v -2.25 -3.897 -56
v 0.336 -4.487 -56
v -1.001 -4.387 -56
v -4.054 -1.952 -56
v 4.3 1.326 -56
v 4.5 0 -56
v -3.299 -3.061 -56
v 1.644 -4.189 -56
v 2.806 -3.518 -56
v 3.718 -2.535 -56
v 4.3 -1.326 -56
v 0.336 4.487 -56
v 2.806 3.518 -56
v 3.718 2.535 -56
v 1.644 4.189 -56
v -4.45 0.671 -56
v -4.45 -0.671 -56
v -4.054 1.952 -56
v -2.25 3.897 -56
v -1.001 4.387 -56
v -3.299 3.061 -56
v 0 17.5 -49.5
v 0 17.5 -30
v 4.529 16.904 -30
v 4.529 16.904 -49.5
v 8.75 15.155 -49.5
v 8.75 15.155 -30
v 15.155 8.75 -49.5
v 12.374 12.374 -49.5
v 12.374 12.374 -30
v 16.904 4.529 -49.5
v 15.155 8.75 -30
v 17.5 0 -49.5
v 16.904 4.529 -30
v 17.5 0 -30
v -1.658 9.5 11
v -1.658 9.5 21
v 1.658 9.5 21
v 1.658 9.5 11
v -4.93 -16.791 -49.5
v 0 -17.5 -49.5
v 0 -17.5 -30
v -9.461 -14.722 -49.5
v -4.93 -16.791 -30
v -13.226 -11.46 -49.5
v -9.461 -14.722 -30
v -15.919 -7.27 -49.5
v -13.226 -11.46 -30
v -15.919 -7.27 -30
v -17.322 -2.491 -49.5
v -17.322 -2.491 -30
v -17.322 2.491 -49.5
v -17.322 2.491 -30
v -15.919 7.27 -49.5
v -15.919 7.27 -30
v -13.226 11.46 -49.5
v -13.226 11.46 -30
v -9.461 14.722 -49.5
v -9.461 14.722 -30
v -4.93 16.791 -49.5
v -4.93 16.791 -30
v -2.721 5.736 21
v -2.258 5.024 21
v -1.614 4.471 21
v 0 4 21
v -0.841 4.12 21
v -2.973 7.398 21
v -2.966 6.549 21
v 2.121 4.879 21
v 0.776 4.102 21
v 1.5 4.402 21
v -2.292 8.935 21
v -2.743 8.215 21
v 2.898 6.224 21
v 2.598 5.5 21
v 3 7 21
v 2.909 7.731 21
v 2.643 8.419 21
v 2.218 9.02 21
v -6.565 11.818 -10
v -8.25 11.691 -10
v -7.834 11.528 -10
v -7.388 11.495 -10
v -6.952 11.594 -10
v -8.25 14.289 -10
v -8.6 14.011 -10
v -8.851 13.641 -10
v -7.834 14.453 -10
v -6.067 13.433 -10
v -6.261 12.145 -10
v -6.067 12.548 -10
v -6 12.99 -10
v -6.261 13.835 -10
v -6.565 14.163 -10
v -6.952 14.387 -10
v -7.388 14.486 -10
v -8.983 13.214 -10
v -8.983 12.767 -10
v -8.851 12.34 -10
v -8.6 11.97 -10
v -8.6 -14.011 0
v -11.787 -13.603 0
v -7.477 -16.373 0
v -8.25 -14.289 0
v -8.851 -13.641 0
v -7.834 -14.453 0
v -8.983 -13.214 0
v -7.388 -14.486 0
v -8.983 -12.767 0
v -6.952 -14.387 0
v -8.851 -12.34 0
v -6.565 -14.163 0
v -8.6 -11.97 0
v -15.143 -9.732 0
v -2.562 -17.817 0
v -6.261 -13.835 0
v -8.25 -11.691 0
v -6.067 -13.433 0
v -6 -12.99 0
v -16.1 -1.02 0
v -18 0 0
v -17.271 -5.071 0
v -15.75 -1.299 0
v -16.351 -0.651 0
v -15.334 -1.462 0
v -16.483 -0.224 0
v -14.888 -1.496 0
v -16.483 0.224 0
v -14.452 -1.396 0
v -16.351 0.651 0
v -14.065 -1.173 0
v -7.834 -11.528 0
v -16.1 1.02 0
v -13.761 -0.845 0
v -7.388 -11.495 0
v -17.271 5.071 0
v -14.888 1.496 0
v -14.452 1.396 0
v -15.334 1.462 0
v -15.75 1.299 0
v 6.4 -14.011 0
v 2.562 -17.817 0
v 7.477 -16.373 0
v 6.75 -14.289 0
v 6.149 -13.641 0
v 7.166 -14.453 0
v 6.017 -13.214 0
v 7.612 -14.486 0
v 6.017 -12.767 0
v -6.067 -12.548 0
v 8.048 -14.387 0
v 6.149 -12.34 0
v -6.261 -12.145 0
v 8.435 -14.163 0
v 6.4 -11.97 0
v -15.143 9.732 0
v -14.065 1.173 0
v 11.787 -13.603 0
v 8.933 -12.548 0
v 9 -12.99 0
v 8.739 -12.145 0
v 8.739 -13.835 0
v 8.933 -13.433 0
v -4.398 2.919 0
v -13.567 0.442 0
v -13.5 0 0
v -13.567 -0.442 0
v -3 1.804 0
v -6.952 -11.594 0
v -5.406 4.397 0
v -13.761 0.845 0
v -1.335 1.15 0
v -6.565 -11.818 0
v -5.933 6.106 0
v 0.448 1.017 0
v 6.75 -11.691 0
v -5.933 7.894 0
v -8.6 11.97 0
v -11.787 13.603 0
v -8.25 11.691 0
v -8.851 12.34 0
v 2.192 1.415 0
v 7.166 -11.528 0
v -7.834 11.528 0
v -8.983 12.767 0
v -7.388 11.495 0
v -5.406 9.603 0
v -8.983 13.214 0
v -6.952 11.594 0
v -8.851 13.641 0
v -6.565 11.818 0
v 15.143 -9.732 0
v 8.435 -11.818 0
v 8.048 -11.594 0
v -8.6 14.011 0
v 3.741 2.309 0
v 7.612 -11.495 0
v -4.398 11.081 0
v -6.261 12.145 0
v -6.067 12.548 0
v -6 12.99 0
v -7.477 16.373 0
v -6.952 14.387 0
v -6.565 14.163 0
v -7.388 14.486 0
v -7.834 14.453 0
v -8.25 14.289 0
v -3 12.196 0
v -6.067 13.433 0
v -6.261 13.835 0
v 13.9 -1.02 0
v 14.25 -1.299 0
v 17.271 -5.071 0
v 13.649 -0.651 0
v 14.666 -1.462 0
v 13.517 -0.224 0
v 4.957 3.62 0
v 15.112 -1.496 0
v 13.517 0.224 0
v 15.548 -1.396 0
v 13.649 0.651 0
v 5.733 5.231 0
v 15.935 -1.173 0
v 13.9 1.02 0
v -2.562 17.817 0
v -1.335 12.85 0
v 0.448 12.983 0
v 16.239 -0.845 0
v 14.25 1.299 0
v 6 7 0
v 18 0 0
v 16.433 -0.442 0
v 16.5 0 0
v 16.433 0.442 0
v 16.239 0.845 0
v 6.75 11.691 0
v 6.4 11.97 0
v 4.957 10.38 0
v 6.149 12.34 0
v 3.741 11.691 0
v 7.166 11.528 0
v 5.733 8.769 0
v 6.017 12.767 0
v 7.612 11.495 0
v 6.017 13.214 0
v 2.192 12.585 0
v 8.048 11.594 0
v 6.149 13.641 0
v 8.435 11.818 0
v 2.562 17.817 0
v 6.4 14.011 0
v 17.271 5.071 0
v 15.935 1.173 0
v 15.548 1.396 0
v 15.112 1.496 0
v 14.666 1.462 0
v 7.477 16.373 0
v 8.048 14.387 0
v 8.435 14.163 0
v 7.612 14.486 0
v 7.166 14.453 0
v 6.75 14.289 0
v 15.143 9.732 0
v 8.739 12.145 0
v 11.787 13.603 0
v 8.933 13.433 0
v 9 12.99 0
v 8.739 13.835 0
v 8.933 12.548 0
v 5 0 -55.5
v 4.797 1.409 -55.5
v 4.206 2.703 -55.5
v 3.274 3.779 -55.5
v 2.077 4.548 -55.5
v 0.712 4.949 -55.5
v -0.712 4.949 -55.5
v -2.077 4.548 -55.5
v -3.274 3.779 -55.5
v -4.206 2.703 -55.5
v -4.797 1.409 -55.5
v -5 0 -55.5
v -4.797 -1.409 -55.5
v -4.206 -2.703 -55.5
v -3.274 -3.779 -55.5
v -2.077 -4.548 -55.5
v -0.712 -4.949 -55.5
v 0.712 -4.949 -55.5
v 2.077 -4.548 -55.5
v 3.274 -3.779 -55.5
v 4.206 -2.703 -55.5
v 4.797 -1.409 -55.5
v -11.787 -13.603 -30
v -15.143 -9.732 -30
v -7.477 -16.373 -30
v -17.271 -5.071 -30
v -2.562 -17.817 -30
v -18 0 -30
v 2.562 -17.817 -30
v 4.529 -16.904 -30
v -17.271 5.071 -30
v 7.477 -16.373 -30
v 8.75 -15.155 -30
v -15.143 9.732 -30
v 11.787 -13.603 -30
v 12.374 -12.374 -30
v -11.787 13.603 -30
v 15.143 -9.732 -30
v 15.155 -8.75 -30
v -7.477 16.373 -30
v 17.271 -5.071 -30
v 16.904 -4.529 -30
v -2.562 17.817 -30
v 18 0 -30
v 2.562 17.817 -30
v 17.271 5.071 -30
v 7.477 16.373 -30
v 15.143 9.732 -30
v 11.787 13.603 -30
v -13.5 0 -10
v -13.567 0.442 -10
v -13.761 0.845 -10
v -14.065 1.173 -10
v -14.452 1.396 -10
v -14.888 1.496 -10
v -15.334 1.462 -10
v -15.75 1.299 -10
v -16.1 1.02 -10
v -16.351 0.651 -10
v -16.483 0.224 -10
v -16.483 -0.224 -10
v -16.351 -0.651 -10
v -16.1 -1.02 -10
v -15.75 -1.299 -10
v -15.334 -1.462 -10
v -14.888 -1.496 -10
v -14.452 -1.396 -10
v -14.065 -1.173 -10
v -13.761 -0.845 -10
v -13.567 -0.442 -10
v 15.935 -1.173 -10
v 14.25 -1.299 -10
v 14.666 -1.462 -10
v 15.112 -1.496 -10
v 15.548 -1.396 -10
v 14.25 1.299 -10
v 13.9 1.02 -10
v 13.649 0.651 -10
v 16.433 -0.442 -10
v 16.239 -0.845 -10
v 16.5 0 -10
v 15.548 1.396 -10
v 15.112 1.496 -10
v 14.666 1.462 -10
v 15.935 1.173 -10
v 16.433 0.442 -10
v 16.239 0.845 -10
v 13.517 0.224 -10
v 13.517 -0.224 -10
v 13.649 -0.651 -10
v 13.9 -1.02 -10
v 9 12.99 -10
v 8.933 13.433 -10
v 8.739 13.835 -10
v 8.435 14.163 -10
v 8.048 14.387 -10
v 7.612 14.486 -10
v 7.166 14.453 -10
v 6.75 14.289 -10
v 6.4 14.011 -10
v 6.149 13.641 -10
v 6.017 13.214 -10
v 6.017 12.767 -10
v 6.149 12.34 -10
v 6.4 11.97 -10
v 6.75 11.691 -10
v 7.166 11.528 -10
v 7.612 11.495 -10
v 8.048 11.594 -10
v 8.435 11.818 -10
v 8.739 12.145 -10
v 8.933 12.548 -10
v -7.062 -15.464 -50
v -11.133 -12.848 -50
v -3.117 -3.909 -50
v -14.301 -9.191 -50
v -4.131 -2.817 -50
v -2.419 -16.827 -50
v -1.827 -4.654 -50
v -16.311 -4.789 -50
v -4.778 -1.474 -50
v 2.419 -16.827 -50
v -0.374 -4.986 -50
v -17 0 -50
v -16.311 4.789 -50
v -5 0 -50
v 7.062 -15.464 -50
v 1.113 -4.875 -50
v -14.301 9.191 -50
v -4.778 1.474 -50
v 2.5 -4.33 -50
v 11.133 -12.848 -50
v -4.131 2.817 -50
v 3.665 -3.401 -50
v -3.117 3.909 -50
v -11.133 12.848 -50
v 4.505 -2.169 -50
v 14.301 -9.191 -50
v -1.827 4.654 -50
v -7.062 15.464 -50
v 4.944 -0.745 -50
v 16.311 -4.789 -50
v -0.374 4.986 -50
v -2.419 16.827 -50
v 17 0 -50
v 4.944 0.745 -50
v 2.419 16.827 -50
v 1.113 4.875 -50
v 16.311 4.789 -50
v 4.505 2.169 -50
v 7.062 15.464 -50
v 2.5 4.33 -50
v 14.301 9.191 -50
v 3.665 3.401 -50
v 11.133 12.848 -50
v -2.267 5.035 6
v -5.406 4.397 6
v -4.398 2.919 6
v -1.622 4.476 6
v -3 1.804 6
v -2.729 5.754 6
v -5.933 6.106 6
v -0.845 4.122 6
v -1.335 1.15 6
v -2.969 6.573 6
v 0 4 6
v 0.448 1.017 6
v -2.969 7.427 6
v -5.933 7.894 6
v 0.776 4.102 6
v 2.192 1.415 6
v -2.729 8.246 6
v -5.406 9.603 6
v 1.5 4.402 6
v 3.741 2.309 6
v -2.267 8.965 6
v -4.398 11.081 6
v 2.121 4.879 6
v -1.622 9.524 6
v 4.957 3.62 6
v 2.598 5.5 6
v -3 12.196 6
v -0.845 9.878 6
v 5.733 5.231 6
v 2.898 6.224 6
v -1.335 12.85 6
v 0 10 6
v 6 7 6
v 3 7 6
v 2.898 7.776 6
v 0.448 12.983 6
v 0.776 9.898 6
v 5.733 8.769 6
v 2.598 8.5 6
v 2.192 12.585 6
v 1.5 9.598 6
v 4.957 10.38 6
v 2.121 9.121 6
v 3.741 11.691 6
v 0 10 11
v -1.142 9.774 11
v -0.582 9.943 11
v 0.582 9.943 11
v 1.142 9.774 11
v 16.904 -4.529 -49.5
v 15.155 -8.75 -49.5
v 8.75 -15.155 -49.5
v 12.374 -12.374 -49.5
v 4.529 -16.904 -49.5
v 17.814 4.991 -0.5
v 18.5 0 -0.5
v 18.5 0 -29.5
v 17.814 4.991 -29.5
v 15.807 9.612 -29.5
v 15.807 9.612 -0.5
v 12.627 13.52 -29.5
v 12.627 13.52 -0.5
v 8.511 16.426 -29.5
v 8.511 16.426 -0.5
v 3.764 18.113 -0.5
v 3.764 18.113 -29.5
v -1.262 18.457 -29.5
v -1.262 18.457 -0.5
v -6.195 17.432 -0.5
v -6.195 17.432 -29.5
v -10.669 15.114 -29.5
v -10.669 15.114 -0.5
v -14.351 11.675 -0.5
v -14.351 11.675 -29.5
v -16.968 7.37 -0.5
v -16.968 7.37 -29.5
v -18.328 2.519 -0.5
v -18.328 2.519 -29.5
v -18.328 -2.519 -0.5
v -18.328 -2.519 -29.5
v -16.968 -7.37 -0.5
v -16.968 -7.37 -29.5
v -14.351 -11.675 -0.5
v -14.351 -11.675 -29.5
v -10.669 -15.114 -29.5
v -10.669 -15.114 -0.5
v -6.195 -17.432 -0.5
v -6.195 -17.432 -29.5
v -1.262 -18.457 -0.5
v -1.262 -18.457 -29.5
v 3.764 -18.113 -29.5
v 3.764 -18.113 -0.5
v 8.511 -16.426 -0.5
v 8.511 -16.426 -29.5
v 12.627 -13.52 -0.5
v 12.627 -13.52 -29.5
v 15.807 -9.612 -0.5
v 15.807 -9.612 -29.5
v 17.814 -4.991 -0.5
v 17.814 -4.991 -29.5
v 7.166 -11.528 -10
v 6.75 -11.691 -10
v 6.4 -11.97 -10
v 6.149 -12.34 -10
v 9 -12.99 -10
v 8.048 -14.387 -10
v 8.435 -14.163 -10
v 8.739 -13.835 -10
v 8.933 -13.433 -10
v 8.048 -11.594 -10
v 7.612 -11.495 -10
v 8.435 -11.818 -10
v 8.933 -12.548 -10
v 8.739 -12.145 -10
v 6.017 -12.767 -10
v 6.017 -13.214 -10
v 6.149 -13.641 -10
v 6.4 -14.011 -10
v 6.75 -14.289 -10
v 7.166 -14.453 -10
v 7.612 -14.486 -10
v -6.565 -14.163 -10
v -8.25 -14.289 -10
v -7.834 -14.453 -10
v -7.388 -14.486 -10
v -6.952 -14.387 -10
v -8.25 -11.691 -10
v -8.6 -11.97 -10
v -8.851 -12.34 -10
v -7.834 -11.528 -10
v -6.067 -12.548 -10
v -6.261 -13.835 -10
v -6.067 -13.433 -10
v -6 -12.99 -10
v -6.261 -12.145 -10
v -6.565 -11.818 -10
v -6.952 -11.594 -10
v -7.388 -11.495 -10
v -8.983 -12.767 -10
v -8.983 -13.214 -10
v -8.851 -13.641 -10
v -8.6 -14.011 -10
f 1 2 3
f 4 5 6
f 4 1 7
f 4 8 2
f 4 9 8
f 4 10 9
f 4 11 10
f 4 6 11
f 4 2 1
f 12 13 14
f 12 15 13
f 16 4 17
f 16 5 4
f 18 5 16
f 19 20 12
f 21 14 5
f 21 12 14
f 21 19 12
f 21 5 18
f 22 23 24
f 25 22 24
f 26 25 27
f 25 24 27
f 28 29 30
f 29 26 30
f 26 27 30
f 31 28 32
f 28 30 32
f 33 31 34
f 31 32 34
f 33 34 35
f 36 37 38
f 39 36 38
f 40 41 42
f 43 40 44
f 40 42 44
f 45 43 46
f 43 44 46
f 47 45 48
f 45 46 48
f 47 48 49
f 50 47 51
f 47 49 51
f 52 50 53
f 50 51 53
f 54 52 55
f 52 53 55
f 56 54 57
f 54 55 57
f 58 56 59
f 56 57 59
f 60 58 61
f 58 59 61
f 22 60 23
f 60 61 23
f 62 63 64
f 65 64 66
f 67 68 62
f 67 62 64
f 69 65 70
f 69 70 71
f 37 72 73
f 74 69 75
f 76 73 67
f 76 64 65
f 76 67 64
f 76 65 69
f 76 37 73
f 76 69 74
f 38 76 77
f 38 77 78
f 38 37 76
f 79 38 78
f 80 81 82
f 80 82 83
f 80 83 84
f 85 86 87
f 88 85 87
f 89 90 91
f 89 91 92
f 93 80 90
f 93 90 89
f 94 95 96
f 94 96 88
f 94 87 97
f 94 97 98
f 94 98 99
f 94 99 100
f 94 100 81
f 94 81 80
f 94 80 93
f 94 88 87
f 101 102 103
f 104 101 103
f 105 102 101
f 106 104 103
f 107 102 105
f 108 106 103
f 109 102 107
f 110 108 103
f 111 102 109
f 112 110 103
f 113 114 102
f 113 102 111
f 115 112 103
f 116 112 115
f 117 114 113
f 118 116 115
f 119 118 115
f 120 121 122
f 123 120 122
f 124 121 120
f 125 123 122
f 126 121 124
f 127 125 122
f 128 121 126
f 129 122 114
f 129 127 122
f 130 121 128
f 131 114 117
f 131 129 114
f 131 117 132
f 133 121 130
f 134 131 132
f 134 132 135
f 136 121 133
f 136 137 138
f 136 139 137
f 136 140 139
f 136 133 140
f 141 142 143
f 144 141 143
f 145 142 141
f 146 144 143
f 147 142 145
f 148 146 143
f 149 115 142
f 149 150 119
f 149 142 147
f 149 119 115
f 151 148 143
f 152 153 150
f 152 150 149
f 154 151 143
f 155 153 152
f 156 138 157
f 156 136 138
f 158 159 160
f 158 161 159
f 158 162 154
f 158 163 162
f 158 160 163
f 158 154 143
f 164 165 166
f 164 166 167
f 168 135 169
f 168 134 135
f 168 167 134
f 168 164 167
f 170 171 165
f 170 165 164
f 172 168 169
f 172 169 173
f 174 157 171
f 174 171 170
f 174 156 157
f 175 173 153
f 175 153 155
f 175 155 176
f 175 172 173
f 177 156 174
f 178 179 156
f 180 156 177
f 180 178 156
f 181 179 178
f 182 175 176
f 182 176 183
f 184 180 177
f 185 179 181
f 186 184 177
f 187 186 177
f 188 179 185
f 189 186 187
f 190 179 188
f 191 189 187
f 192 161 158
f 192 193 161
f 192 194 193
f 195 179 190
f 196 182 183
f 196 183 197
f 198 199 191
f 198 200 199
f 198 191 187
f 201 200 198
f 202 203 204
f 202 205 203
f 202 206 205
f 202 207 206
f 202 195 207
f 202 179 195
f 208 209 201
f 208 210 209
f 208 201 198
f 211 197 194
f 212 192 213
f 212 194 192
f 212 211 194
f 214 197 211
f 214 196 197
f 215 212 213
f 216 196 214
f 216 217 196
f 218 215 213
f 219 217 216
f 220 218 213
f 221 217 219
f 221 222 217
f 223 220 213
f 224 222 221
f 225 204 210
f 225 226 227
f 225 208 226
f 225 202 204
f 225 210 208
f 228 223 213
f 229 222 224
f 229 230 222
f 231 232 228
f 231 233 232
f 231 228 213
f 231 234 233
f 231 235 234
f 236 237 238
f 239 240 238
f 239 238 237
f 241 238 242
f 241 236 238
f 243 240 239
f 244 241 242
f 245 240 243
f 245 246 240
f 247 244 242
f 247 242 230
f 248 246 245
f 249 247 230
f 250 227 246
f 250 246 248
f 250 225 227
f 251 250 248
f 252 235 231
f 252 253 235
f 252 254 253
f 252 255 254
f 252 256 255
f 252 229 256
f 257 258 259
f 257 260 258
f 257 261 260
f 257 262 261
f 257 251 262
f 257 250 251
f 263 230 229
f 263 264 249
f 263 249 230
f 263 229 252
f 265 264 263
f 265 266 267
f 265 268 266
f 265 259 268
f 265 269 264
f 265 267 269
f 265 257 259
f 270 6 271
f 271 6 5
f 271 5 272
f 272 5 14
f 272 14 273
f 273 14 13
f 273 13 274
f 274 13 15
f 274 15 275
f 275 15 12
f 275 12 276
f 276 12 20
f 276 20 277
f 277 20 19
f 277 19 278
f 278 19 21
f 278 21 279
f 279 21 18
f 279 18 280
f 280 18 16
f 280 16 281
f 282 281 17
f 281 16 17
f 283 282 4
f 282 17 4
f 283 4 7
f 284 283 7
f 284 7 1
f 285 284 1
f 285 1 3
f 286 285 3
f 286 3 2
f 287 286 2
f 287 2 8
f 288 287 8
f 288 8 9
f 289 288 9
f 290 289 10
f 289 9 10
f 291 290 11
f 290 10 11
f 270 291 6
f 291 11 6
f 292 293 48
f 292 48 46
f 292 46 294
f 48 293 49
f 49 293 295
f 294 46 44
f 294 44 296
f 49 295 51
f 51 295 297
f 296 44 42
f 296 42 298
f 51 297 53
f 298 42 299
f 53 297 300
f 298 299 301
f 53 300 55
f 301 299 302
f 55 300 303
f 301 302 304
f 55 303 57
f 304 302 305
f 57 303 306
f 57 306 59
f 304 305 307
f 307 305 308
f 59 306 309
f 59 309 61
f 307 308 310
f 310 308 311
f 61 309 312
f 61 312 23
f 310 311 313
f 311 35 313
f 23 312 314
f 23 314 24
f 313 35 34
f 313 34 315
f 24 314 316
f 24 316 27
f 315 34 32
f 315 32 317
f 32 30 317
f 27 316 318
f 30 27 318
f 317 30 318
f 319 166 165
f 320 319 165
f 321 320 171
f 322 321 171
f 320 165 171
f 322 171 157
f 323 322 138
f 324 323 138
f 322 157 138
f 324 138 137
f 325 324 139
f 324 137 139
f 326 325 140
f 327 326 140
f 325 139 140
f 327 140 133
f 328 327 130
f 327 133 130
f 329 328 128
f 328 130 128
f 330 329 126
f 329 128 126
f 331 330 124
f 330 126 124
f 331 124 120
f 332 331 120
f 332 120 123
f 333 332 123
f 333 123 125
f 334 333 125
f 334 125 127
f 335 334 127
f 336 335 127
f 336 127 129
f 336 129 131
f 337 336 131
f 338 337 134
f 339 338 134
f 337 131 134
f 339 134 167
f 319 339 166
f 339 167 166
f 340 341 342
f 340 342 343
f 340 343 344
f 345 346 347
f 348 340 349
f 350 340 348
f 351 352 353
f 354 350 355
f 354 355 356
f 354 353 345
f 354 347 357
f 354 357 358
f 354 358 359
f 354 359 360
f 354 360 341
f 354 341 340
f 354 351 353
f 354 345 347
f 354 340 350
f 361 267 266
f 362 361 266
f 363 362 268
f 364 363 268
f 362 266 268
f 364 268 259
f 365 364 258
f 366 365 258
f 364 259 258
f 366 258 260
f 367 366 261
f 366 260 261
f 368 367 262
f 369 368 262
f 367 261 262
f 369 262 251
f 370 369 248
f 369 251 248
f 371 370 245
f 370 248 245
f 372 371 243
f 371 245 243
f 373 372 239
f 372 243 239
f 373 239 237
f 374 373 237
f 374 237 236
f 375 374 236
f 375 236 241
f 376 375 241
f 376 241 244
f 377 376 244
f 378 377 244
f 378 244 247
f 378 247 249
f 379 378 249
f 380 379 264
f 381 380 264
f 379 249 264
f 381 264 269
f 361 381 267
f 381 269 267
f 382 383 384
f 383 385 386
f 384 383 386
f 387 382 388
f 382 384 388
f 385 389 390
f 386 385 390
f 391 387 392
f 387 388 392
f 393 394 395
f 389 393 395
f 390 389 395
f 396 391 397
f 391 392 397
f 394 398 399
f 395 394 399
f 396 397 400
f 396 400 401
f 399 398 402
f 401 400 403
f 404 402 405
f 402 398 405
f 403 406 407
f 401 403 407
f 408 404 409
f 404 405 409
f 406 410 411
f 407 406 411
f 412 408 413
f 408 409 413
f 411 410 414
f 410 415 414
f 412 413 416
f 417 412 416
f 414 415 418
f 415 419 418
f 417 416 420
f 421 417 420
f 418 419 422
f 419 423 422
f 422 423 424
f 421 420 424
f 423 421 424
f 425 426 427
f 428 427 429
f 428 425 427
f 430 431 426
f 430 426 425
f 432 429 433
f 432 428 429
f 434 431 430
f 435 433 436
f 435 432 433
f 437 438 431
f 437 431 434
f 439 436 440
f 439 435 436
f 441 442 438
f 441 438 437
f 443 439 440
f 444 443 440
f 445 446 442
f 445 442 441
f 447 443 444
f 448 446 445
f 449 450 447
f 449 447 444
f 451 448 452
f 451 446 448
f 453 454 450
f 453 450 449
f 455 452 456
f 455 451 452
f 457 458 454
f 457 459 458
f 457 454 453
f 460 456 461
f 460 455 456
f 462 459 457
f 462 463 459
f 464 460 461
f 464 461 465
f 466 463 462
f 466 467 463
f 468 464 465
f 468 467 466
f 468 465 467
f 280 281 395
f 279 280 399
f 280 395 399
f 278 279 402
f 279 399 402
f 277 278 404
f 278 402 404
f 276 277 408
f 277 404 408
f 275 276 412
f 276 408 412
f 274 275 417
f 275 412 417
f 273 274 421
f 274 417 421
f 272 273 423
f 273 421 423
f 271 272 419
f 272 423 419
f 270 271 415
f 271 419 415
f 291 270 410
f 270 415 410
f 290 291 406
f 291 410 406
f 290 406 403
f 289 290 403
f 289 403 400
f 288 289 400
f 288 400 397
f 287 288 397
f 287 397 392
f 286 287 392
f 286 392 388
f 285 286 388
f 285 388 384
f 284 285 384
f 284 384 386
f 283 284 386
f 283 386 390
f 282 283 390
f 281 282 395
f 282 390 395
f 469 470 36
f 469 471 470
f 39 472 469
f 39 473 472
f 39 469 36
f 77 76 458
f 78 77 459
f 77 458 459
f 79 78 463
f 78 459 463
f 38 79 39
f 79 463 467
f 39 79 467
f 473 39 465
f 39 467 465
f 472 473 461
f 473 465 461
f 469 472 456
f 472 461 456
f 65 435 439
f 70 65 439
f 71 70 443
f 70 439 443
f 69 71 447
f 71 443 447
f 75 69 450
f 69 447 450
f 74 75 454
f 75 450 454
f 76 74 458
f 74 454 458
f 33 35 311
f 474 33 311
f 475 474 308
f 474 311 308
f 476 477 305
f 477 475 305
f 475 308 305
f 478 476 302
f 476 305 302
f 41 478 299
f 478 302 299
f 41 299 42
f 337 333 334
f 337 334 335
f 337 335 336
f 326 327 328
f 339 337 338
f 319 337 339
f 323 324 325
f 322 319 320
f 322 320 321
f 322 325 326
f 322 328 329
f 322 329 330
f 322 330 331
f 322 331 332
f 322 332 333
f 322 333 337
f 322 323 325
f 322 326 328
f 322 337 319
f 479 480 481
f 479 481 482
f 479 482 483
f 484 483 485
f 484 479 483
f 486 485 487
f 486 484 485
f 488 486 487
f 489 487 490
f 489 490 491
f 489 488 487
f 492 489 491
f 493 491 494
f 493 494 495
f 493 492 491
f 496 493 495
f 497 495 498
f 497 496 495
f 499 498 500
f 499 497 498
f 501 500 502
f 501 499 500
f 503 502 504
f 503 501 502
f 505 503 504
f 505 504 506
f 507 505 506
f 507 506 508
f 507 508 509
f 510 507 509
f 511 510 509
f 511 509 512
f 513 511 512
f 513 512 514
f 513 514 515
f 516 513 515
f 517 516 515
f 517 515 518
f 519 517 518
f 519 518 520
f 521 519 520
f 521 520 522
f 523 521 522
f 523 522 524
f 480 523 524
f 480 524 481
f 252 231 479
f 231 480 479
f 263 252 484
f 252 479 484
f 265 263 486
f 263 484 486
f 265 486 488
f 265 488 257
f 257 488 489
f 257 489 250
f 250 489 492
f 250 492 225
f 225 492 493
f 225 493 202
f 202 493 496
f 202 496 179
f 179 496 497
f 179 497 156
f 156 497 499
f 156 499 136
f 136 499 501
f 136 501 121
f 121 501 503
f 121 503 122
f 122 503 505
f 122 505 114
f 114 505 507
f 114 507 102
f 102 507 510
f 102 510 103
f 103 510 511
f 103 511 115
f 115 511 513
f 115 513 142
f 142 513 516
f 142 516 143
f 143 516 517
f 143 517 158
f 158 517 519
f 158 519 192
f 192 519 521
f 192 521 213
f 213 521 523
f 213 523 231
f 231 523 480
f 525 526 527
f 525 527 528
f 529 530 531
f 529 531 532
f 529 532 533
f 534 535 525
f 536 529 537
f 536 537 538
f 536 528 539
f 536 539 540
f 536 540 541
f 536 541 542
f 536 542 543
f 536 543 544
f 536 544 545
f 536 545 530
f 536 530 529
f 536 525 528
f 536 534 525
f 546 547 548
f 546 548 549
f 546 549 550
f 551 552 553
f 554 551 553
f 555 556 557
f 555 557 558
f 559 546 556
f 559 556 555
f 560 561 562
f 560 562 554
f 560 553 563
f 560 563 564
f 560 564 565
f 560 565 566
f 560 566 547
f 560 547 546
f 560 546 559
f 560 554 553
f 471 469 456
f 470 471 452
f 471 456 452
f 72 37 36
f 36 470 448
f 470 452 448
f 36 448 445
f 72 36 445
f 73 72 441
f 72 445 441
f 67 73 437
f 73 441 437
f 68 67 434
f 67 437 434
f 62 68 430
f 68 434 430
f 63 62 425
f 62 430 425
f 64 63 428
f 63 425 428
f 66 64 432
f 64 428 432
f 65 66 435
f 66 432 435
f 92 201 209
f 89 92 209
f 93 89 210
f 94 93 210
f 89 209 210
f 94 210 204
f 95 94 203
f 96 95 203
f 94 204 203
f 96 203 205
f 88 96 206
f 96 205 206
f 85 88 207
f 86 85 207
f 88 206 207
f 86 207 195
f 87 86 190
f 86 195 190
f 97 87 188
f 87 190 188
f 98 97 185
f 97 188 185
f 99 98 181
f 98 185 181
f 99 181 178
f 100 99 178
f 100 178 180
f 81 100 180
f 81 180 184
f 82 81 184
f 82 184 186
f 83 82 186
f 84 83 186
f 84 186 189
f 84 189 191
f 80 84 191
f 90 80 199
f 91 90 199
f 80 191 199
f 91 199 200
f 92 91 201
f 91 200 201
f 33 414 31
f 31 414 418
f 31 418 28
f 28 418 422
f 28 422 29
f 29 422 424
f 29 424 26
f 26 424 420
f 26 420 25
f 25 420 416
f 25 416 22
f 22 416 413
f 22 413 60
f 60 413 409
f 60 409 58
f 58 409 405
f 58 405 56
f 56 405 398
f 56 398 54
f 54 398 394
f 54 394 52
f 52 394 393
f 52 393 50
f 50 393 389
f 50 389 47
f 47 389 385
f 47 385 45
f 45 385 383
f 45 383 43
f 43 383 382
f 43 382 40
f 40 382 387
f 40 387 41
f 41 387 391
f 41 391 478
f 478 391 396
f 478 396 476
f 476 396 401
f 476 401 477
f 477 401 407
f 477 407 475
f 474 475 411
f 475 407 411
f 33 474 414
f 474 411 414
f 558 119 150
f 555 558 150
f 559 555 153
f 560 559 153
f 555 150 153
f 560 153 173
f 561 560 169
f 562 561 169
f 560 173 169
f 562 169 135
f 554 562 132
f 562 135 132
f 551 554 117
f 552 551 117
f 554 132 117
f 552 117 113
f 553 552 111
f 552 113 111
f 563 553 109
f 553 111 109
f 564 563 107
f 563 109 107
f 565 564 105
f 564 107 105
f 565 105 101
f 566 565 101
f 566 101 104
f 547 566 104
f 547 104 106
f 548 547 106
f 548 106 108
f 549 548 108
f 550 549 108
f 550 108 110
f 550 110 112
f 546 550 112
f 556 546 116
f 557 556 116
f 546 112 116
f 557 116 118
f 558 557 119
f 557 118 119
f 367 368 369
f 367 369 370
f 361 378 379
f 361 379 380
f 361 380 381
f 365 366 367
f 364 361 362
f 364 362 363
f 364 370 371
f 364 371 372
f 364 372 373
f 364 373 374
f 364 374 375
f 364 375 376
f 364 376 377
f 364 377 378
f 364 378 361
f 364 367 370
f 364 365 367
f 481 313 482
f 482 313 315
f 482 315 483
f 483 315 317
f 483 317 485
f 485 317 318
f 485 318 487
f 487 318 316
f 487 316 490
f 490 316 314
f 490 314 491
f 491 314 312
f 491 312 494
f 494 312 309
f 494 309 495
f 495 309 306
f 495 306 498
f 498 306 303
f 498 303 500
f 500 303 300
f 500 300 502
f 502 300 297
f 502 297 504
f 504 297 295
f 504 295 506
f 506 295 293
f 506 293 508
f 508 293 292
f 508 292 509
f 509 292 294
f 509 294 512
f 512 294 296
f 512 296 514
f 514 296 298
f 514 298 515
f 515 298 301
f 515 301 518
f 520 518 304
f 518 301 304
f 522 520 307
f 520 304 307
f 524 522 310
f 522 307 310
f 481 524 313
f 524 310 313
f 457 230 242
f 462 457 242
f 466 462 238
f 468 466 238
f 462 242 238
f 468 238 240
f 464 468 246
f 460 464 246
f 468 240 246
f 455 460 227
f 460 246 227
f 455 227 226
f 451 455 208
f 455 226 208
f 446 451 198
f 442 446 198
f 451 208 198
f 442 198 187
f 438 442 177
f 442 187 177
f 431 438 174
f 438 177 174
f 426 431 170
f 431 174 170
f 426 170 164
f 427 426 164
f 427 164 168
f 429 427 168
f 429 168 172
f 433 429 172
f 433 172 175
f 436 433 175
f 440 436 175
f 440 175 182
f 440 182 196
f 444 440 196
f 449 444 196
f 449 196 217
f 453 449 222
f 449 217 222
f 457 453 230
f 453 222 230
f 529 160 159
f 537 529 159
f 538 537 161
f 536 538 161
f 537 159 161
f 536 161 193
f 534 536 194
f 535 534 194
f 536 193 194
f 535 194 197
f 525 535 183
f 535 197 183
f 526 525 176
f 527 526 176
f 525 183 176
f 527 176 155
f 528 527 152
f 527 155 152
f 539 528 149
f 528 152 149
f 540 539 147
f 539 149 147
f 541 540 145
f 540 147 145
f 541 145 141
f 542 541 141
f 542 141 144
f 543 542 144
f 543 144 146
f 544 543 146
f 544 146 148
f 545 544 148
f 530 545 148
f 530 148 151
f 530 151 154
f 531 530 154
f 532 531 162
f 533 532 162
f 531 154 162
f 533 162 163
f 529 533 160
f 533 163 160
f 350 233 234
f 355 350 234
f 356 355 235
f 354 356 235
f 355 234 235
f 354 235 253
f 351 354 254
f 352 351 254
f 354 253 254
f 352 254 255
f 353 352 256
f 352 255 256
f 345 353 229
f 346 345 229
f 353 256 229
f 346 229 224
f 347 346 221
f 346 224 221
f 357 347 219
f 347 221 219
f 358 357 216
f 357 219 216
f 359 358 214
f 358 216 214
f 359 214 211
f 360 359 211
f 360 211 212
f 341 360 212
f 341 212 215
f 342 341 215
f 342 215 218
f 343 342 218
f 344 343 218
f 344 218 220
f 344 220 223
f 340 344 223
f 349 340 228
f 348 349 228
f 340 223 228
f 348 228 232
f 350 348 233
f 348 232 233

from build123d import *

# Parameters (mm, degrees)
SKETCH_1_R          = 18.5
EXTRUDE_1_DEPTH     = 50
SKETCH_2_R          = 5
EXTRUDE_2_DEPTH     = 6
EXTRUDE_3_DEPTH     = 21
CUT_EXTRUDE_1_DEPTH = 10
SKETCH_5_R          = 6
EXTRUDE_4_DEPTH     = 6
CUT_EXTRUDE_START   = -30
CUT_EXTRUDE_2_DEPTH = 20
SKETCH_8_R          = 1.5
CUT_EXTRUDE_3_DEPTH = 10


with BuildPart() as part:
    # 草图1 → 凸台-拉伸1 (new body)
    with BuildSketch(Plane.XY):
        Circle(SKETCH_1_R)
    extrude(amount=-EXTRUDE_1_DEPTH)

    # 草图2 → 凸台-拉伸2 (add)
    with BuildSketch(Plane(origin=(0, 0, -50), x_dir=(-1, 0, 0), z_dir=(0, 0, -1))):
        Circle(SKETCH_2_R)
    extrude(amount=EXTRUDE_2_DEPTH)

    # 草图1<3> → 凸台-拉伸3 (add)
    with BuildSketch(Plane.XY):
        with BuildLine():
            ThreePointArc((0, 10), (-3, 7), (0, 4))
            Line((0, 4), (0, 10))
        make_face()
        with BuildLine():
            Line((0, 10), (0, 4))
            ThreePointArc((0, 4), (2.121320344, 4.878679656), (3, 7))
            ThreePointArc((3, 7), (2.121320344, 9.121320344), (0, 10))
        make_face()
    extrude(amount=EXTRUDE_3_DEPTH)

    # 草图4 → 切除-拉伸1 (cut)
    with BuildSketch(Plane.XY.offset(21)):
        Polygon((-80.661429966, 9.5), (-1.658312395, 9.5), (1.658312395, 9.5), (80.661429966, 9.5), (80.661429966, 167.506235142), (-80.661429966, 167.506235142), align=None)
    extrude(amount=-CUT_EXTRUDE_1_DEPTH, mode=Mode.SUBTRACT)

    # 草图5 → 凸台-拉伸4 (add)
    with BuildSketch(Plane.XY):
        with Locations((0, 7)):
            Circle(SKETCH_5_R)
    extrude(amount=EXTRUDE_4_DEPTH)

    # 草图1<5> → 切除-拉伸2 (cut)
    with BuildSketch(Plane.XY.offset(CUT_EXTRUDE_START)):
        with BuildLine():
            ThreePointArc((0, 18.5), (-18.5, 0), (0, -18.5))
            Line((0, -18.5), (0, -17.5))
            ThreePointArc((0, -17.5), (-17.5, 0), (0, 17.5))
            Line((0, 17.5), (0, 18.5))
        make_face()
        with BuildLine():
            Line((0, -17.5), (0, -18.5))
            ThreePointArc((0, -18.5), (13.081475452, -13.081475452), (18.5, 0))
            ThreePointArc((18.5, 0), (13.081475452, 13.081475452), (0, 18.5))
            Line((0, 18.5), (0, 17.5))
            ThreePointArc((0, 17.5), (12.374368671, 12.374368671), (17.5, 0))
            ThreePointArc((17.5, 0), (12.374368671, -12.374368671), (0, -17.5))
        make_face()
    extrude(amount=-CUT_EXTRUDE_2_DEPTH, mode=Mode.SUBTRACT)

    # 倒角1: read off the stored shape, not the designer's step
    # 倒角1 outline → 倒角1 (revolve, cut)
    with BuildSketch(Plane.XZ):
        Polygon((5, -55.5), (4.5, -56), (5, -56), align=None)
        Polygon((17.5, -49.5), (17, -50), (17.5, -50), align=None)
        Polygon((18.5, -29.5), (18, -30), (18.5, -30), align=None)
        Polygon((18, 0), (18.5, -0.5), (18.5, 0), align=None)
    revolve(axis=Axis((0, 0, 0), (0, 0, 1)), mode=Mode.SUBTRACT)

    # 草图8 → 切除-拉伸3 (cut)
    with BuildSketch(Plane.XY):
        with Locations((15, 0)):
            Circle(SKETCH_8_R)
        with Locations((7.5, -12.990381057)):
            Circle(SKETCH_8_R)
        with Locations((-7.5, -12.990381057)):
            Circle(SKETCH_8_R)
        with Locations((-15, 0)):
            Circle(SKETCH_8_R)
        with Locations((-7.5, 12.990381057)):
            Circle(SKETCH_8_R)
        with Locations((7.5, 12.990381057)):
            Circle(SKETCH_8_R)
    extrude(amount=-CUT_EXTRUDE_3_DEPTH, mode=Mode.SUBTRACT)


solid = part.part
